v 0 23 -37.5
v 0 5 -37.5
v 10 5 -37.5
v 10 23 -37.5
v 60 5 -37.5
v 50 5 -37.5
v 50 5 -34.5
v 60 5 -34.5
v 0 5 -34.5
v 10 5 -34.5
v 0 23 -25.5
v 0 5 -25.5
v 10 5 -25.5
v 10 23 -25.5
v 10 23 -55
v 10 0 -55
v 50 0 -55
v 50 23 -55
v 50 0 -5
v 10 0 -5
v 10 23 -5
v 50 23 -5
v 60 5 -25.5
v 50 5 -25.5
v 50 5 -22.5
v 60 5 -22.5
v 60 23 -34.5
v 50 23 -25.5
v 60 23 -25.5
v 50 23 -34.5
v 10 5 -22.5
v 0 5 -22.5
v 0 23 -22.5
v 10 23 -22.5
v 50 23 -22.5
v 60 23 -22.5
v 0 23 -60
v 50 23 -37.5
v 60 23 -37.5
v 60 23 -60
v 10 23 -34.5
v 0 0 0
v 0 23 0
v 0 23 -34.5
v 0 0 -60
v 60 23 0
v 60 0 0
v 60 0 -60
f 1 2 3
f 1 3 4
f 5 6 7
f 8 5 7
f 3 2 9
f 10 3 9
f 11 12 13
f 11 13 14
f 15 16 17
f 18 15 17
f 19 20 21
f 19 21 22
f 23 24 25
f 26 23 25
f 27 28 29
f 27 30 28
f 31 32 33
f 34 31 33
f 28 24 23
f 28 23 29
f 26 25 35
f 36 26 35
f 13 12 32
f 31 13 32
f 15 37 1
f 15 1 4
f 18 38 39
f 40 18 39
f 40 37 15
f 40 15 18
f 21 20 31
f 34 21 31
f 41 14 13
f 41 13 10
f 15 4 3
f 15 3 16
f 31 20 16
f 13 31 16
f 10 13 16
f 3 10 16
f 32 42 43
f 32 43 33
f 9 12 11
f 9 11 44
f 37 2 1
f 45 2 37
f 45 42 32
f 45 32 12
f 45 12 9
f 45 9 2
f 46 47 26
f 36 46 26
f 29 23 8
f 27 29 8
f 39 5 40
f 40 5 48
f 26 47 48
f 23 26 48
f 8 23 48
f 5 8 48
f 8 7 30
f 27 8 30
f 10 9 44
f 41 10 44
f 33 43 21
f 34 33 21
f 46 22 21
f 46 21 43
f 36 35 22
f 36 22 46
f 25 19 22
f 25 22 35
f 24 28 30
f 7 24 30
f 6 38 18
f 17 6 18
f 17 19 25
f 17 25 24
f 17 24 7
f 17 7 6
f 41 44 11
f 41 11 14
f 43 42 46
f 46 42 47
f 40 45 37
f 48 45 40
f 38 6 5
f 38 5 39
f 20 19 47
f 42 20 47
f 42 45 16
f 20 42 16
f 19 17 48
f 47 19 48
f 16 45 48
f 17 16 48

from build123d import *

# Parameters (mm, degrees)
SKETCH2_W           = 60
SKETCH2_H           = 60
SKETCH2_W_2         = 40
SKETCH2_H_2         = 50
BOSS_EXTRUDE2_DEPTH = 23
SKETCH3_W           = 3
SKETCH3_H           = 18
CUT_EXTRUDE1_DEPTH  = 88.914731416


with BuildPart() as part:
    # Sketch2 → Boss-Extrude2 (new body)
    with BuildSketch(Plane(origin=(0, 0, 0), x_dir=(1, 0, 0), z_dir=(0, 1, 0))):
        with Locations((30, 30)):
            Rectangle(SKETCH2_W, SKETCH2_H)
        with Locations((30, 30)):
            Rectangle(SKETCH2_W_2, SKETCH2_H_2, mode=Mode.SUBTRACT)
    extrude(amount=BOSS_EXTRUDE2_DEPTH)

    # Sketch3 → Cut-Extrude1 (cut, through all)
    with BuildSketch(Plane.ZY):
        with Locations((-36, 14)):
            Rectangle(SKETCH3_W, SKETCH3_H)
        with Locations((-24, 14)):
            Rectangle(SKETCH3_W, SKETCH3_H)
    extrude(amount=-CUT_EXTRUDE1_DEPTH, mode=Mode.SUBTRACT)


solid = part.part
